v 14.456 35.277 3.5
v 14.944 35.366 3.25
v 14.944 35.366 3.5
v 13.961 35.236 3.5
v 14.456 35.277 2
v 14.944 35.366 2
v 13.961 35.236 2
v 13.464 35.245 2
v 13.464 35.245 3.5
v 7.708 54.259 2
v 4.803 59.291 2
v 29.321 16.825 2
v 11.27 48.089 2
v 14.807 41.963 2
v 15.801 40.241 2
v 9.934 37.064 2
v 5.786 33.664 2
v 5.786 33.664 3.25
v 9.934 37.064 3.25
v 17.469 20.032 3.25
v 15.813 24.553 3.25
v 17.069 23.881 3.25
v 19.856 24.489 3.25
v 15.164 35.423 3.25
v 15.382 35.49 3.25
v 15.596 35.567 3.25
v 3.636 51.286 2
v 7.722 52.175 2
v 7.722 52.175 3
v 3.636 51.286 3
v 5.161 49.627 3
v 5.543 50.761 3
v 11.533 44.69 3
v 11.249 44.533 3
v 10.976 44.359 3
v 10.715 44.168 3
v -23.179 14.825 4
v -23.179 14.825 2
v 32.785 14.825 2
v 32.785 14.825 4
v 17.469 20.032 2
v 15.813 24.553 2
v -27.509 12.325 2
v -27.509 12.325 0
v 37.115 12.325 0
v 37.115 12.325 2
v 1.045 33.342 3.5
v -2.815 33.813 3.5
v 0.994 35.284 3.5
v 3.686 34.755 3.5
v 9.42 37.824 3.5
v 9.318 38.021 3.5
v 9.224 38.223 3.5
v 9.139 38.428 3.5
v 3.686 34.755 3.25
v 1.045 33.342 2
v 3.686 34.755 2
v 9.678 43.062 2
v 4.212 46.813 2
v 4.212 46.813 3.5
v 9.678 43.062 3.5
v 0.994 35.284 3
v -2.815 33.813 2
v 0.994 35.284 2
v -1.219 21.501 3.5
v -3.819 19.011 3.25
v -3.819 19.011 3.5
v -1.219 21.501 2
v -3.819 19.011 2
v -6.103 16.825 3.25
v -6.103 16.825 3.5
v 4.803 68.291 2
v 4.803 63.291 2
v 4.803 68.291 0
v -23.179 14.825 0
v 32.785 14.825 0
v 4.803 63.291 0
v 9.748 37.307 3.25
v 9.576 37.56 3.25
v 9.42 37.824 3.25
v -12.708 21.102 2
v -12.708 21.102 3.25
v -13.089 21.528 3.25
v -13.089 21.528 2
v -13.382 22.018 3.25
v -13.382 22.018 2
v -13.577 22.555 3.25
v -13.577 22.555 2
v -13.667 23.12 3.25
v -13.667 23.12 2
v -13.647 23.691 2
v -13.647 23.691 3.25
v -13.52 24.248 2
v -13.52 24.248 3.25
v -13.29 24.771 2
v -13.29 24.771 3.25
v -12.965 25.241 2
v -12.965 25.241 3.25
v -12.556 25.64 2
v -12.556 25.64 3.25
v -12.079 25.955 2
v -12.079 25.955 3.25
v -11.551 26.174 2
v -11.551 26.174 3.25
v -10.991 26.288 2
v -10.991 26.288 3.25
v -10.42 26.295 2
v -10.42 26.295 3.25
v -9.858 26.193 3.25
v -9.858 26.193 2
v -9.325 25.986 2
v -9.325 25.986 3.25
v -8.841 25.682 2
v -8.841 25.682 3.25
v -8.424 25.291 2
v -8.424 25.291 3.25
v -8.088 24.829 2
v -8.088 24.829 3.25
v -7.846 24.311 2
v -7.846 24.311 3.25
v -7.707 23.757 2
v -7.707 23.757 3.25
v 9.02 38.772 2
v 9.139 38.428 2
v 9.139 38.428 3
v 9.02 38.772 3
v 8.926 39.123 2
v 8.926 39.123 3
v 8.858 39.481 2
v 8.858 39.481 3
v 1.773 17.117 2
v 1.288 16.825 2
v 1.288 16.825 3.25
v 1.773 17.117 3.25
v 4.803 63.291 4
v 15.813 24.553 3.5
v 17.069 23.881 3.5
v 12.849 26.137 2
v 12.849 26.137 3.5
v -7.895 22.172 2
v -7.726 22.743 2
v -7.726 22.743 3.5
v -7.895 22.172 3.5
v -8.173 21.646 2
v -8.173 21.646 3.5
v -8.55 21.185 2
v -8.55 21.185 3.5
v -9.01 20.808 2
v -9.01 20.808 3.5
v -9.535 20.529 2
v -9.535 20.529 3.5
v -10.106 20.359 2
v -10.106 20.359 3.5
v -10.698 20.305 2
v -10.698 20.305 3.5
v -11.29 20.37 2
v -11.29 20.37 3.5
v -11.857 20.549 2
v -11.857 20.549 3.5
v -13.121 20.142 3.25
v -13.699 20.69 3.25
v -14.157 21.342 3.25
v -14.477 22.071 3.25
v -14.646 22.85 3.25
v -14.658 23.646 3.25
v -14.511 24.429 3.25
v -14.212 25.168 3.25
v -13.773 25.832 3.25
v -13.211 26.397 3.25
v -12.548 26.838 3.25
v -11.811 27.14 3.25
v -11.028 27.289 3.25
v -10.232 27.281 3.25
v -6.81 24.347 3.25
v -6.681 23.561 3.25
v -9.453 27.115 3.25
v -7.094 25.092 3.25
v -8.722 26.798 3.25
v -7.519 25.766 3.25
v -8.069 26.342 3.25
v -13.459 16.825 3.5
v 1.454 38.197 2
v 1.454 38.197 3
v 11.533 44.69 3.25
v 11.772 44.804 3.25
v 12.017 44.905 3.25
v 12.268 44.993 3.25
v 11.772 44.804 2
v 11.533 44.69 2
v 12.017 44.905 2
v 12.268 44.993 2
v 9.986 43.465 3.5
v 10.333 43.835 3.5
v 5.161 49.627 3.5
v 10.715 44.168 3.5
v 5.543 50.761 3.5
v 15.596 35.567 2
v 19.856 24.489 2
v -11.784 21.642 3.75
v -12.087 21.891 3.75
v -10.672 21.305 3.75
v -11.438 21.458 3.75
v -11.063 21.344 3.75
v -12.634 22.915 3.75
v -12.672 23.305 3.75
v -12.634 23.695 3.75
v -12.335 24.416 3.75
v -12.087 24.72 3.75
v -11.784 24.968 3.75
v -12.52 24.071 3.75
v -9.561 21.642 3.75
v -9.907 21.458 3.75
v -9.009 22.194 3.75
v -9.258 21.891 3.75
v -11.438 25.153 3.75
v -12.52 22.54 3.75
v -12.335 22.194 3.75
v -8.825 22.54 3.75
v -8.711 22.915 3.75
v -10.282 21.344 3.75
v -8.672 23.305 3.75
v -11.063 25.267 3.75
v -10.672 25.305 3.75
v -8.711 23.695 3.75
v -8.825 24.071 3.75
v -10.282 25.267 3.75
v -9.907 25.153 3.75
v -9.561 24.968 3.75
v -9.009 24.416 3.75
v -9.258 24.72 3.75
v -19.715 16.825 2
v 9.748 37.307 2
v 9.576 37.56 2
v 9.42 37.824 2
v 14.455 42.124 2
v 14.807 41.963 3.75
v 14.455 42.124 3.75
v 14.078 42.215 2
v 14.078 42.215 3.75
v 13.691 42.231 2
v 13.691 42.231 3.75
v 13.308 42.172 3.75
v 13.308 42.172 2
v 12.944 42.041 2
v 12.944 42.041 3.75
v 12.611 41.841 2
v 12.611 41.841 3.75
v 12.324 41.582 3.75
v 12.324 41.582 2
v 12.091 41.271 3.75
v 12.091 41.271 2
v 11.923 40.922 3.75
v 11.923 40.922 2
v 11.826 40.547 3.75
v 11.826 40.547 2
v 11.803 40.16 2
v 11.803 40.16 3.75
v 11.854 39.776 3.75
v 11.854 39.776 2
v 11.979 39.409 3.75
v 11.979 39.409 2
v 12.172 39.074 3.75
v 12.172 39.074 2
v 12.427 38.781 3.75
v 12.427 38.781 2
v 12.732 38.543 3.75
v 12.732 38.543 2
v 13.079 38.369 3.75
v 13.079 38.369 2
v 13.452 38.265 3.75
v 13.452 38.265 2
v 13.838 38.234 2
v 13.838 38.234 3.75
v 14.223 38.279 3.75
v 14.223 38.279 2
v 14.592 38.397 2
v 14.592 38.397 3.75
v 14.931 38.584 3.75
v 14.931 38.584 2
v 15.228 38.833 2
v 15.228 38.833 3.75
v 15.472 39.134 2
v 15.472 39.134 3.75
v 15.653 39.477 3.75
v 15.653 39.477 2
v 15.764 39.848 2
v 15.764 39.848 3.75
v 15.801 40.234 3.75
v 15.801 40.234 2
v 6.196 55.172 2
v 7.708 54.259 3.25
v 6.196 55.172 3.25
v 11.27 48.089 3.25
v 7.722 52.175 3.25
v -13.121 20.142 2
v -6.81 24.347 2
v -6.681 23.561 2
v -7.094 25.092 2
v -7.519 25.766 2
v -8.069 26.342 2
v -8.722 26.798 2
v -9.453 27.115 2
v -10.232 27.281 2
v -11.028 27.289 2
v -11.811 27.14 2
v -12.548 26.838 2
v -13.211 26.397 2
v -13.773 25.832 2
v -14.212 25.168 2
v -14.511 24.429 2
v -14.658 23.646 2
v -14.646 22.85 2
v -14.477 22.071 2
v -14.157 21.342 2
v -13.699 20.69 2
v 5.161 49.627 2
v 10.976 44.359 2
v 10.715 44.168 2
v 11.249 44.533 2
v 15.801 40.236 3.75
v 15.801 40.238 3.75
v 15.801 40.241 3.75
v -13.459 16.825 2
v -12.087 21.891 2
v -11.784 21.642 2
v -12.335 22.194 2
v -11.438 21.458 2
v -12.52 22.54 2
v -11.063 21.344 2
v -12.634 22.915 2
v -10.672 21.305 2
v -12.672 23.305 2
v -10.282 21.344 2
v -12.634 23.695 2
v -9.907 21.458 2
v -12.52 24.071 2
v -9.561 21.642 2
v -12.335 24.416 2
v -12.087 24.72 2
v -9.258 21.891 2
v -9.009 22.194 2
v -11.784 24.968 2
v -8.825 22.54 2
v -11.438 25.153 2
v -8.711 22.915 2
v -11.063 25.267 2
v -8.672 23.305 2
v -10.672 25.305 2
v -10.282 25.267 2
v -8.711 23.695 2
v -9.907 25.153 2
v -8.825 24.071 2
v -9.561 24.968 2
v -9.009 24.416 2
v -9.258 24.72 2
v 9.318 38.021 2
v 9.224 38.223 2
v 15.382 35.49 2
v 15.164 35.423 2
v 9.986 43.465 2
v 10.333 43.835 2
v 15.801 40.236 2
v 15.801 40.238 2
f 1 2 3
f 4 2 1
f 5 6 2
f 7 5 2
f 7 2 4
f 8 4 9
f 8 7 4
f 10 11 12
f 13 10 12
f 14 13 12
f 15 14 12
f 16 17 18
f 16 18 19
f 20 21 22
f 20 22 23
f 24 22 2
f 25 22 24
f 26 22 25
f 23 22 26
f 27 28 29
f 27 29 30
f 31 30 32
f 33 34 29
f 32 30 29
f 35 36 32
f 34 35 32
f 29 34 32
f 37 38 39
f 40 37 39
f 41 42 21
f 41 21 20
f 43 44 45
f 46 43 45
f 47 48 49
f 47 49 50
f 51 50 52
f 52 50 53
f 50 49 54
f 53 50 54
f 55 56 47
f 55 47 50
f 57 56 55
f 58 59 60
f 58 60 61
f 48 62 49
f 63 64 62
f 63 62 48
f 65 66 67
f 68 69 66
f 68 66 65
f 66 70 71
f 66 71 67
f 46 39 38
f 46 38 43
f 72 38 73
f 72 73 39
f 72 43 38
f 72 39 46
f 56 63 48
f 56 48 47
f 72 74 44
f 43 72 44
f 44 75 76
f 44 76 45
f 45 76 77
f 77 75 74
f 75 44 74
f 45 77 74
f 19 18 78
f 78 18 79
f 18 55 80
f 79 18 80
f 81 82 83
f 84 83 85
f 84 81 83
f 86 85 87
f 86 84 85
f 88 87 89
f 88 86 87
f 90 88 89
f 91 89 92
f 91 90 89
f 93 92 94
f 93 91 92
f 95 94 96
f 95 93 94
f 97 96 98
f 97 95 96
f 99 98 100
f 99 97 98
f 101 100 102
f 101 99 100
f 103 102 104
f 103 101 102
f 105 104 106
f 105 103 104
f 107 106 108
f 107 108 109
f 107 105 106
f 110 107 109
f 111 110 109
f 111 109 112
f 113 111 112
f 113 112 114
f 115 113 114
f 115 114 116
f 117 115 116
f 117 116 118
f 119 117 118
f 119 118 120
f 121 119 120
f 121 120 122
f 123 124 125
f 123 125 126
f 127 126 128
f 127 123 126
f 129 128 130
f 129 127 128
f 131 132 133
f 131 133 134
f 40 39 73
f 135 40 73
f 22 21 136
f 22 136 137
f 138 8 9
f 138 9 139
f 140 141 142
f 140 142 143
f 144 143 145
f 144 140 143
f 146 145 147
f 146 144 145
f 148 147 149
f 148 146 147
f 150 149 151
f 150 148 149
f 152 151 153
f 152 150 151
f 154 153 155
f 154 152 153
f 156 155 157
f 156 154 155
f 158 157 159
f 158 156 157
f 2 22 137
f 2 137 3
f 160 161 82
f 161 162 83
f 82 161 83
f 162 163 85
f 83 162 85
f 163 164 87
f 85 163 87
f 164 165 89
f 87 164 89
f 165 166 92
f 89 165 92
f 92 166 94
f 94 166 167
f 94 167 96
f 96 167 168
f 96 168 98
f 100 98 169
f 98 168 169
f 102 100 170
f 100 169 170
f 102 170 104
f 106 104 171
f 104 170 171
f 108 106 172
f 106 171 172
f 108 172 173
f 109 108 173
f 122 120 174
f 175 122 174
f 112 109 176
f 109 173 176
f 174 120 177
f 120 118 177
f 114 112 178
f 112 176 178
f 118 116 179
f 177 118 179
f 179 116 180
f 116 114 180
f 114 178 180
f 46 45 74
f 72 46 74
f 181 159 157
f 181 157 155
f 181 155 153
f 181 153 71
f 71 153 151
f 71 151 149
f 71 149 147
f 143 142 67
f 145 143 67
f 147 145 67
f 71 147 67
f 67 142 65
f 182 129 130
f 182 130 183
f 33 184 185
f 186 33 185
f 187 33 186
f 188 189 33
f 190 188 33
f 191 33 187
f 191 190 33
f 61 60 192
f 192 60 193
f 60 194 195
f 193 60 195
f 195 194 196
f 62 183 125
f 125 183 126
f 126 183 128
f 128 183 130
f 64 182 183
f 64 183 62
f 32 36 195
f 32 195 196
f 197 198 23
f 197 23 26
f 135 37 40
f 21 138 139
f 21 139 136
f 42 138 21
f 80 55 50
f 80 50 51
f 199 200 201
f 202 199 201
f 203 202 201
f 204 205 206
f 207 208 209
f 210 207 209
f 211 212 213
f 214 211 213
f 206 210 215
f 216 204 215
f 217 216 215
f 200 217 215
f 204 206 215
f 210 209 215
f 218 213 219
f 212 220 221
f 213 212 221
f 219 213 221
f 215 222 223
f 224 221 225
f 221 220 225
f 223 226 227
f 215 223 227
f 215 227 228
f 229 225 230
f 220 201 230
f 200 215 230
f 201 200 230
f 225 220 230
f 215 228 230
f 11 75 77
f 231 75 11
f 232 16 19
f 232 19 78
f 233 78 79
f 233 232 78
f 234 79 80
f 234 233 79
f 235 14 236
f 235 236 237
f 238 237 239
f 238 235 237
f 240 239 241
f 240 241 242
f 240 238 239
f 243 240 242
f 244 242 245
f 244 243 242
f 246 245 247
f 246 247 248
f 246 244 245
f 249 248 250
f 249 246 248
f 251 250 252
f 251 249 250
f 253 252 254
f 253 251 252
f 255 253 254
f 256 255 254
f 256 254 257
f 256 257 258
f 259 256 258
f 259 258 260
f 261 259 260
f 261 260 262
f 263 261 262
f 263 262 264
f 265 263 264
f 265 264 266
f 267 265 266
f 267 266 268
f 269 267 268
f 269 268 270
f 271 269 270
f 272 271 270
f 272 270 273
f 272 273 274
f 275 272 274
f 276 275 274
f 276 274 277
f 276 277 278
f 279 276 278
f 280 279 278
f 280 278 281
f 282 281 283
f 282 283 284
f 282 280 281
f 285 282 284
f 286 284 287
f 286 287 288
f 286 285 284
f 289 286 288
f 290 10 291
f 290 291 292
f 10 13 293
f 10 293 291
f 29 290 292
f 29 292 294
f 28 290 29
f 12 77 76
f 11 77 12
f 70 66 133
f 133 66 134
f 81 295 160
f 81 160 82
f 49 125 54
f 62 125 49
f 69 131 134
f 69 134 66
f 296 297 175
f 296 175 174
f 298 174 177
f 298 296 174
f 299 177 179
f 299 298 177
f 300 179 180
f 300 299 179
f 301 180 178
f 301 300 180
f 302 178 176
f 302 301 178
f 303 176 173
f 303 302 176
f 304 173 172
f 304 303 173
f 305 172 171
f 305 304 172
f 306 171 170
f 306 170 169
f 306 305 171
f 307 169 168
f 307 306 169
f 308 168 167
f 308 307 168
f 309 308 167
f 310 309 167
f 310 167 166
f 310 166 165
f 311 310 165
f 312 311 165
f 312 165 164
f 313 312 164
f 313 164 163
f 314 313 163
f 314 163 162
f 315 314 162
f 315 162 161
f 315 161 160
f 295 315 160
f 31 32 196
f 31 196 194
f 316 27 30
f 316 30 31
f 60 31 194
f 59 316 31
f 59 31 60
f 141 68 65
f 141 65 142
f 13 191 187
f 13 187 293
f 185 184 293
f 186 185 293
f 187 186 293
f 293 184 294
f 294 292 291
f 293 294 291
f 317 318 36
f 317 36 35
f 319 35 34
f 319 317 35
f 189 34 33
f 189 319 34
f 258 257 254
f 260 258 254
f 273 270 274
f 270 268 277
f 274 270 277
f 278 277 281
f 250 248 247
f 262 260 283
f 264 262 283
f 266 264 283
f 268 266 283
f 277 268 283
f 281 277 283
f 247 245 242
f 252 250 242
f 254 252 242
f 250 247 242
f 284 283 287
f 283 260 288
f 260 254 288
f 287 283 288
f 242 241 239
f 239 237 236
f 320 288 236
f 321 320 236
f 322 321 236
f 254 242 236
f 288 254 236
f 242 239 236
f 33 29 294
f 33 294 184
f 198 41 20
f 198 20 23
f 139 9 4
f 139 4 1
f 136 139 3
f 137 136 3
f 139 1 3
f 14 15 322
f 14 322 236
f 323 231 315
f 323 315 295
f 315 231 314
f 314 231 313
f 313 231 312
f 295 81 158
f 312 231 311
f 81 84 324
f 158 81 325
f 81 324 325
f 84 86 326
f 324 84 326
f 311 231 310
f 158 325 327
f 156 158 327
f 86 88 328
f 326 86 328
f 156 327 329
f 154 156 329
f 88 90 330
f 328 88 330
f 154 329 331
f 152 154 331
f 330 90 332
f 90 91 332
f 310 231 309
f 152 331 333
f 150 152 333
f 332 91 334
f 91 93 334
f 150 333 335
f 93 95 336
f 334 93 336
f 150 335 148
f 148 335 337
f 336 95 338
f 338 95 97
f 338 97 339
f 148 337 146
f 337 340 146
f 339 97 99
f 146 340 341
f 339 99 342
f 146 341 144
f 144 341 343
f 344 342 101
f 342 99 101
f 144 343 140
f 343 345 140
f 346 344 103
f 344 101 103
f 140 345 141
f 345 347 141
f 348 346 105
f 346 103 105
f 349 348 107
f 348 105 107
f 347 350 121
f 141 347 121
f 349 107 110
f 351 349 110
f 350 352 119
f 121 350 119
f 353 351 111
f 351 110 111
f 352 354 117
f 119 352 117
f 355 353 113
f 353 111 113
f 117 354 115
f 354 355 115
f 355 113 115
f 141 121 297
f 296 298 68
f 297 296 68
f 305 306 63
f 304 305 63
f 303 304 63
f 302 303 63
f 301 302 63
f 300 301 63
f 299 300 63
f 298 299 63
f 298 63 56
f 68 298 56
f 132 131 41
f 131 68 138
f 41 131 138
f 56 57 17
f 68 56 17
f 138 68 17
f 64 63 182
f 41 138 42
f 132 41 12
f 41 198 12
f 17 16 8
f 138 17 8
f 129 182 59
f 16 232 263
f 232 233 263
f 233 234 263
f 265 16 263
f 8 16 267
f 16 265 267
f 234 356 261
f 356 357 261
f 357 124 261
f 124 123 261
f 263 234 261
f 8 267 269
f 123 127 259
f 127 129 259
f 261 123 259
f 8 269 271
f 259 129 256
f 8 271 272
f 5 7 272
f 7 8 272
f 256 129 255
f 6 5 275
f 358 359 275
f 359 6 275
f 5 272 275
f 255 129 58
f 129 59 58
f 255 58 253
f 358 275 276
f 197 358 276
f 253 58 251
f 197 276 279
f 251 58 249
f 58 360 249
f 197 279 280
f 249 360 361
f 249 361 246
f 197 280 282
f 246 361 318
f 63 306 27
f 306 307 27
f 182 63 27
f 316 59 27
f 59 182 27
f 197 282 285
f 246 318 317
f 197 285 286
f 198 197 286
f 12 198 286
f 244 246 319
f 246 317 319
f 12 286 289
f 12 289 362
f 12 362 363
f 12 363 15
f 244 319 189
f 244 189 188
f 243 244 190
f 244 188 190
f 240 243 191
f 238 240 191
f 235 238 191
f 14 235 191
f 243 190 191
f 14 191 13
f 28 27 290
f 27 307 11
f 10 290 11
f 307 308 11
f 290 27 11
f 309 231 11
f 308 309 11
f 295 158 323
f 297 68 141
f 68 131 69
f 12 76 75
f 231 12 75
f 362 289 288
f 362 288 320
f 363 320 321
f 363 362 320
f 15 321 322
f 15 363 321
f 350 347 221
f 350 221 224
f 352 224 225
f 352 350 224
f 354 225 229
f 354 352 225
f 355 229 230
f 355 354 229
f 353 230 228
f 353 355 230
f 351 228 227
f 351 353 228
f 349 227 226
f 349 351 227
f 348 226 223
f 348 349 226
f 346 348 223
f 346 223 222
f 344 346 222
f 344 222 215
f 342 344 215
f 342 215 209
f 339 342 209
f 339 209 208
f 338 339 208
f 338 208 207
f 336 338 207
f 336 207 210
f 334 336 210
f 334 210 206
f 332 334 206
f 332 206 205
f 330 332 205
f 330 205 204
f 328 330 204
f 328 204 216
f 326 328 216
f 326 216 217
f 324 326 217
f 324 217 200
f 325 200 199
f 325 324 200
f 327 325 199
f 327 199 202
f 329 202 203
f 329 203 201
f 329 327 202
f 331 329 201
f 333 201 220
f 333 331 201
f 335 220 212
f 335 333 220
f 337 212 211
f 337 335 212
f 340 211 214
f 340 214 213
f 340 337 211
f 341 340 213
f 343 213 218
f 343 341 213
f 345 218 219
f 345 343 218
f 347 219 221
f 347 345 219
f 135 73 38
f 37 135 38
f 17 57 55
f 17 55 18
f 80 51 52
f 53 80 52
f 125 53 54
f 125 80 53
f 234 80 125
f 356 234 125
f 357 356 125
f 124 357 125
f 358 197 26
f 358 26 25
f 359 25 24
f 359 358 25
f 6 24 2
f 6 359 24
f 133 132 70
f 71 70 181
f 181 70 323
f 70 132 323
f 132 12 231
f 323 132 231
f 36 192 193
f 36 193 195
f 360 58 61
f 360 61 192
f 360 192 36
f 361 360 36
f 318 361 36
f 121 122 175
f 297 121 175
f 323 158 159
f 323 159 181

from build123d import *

# Parameters (mm, degrees)
F1_DEPTH = 4
F2_DEPTH = 2
F3_START = 2
F3_DEPTH = 2
F4_SIZE  = 1.99999
F5_R     = 2
F6_DEPTH = 3.75
F7_DEPTH = 3.5
F8_DEPTH = 3.25
F9_DEPTH = 3


# Not quite as in the source:
# - a fillet or chamfer is up to 0.001 mm smaller than in the source, because OpenCascade refuses the exact size


with BuildPart() as f1:
    # F0 (on Top) → F1 (new body)
    with BuildSketch(Plane.XY):
        Polygon((32.7846783229, 14.824549064), (4.8026783229, 63.2907947614), (-23.1793216771, 14.824549064), align=None)
        Polygon((-19.715220062, 16.824549064), (4.8026783229, 59.2907947614), (29.3205767077, 16.824549064), align=None, mode=Mode.SUBTRACT)
    extrude(amount=F1_DEPTH)

    # F0 (on Top) → F2 (join)
    with BuildSketch(Plane.XY):
        Polygon((37.1148053418, 12.324549064), (4.8026783229, 68.2907947614), (-27.509448696, 12.324549064), align=None)
        Polygon((-23.1793216771, 14.824549064), (4.8026783229, 63.2907947614), (32.7846783229, 14.824549064), align=None, mode=Mode.SUBTRACT)
    extrude(amount=F2_DEPTH)

    # F0 (on Top) → F3 (join)
    with BuildSketch(Plane.XY.offset(F3_START)):
        Polygon((29.3205767077, 16.824549064), (4.8026783229, 59.2907947614), (-19.715220062, 16.824549064), align=None)
    extrude(amount=F3_DEPTH)

    # F4 (size 2 in the source; OpenCascade refuses exactly that, so slightly less here)
    f4_edges = [f1.edges().sort_by_distance(p)[0] for p in [
        (4.802678, 16.824549, 0),
        (-7.456271, 38.057672, 0),
        (17.061628, 38.057672, 0),
    ]]
    chamfer(f4_edges, length=F4_SIZE)

    # F5 (on face) → F6 (cut)
    with BuildSketch(Plane.XY):
        with BuildLine():
            Line((15.8012454512, 40.2407176847), (14.8071694273, 41.9625078646))
            ThreePointArc((14.8071694273, 41.9625078646), (12.0675004242, 39.2368445398), (15.801257126, 40.2338840067))
            ThreePointArc((15.801257126, 40.2338840067), (15.8012542073, 40.2373008507), (15.8012454512, 40.2407176847))
        make_face()
        with Locations((-10.6723830104, 23.3052875847)):
            Circle(F5_R)
    extrude(amount=F6_DEPTH, mode=Mode.SUBTRACT)

    # F5 (on face) → F7 (cut)
    with BuildSketch(Plane.XY):
        with BuildLine():
            Line((3.6860700174, 34.755180139), (9.4204377363, 37.8238173116))
            ThreePointArc((9.4204377363, 37.8238173116), (9.2694965624, 38.1212680469), (9.1387235678, 38.4281207834))
            Line((9.1387235678, 38.4281207834), (0.9941436583, 35.2838113904))
            Line((0.9941436583, 35.2838113904), (-2.8154677711, 33.8130667806))
            Line((-2.8154677711, 33.8130667806), (1.0452440474, 33.3419926465))
            Line((1.0452440474, 33.3419926465), (3.6860700174, 34.755180139))
        make_face()
        with BuildLine():
            Line((17.0693753854, 23.8813530259), (14.9441122519, 35.3662478082))
            ThreePointArc((14.9441122519, 35.3662478082), (14.2087911946, 35.2505200844), (13.4644377158, 35.2452416378))
            Line((13.4644377158, 35.2452416378), (12.8494622186, 26.1368211359))
            Line((12.8494622186, 26.1368211359), (15.8132929355, 24.552706629))
            Line((15.8132929355, 24.552706629), (17.0693753854, 23.8813530259))
        make_face()
        with BuildLine():
            Line((-13.4587365793, 16.824549064), (-6.1025659626, 16.824549064))
            Line((-6.1025659626, 16.824549064), (-3.819498702, 19.0105444595))
            Line((-3.819498702, 19.0105444595), (-1.2189327972, 21.5005390346))
            Line((-1.2189327972, 21.5005390346), (-7.725601985, 22.742720621))
            ThreePointArc((-7.725601985, 22.742720621), (-9.2656609828, 20.6555454959), (-11.8573356204, 20.5492238495))
            Line((-11.8573356204, 20.5492238495), (-13.4587365793, 16.824549064))
        make_face()
        with BuildLine():
            ThreePointArc((9.6781818277, 43.0623553402), (10.154568974, 43.6546537332), (10.7152328484, 44.1678964823))
            Line((10.7152328484, 44.1678964823), (5.5434275419, 50.7608279586))
            Line((5.5434275419, 50.7608279586), (5.1609951292, 49.6271412781))
            Line((5.1609951292, 49.6271412781), (4.2115291581, 46.8125343323))
            Line((4.2115291581, 46.8125343323), (9.6781818277, 43.0623553402))
        make_face()
    extrude(amount=F7_DEPTH, mode=Mode.SUBTRACT)

    # F5 (on face) → F8 (cut)
    with BuildSketch(Plane.XY):
        with BuildLine():
            Line((19.8564007878, 24.4885329157), (15.5959561349, 35.5670804467))
            ThreePointArc((15.5959561349, 35.5670804467), (15.2734627879, 35.4555359146), (14.9441122519, 35.3662478082))
            Line((14.9441122519, 35.3662478082), (17.0693753854, 23.8813530259))
            Line((17.0693753854, 23.8813530259), (15.8132929355, 24.552706629))
            Line((15.8132929355, 24.552706629), (17.4690298736, 20.0315453112))
            Line((17.4690298736, 20.0315453112), (19.8564007878, 24.4885329157))
        make_face()
        Polygon((-6.1025659626, 16.824549064), (1.2875116271, 16.824549064), (1.7734020948, 17.1169545501), (-3.819498702, 19.0105444595), align=None)
        with BuildLine():
            Line((5.785849411, 33.66388008), (9.9342960343, 37.064244924))
            ThreePointArc((9.9342960343, 37.064244924), (9.6599157648, 37.4322252607), (9.4204377363, 37.8238173116))
            Line((9.4204377363, 37.8238173116), (3.6860700174, 34.755180139))
            Line((3.6860700174, 34.755180139), (5.785849411, 33.66388008))
        make_face()
        with BuildLine():
            ThreePointArc((11.5326481984, 44.6896009562), (11.8941525727, 44.8558913869), (12.2677356256, 44.9929082563))
            Line((12.2677356256, 44.9929082563), (11.2701070238, 48.0888796571))
            Line((11.2701070238, 48.0888796571), (7.7075759005, 54.2593645662))
            Line((7.7075759005, 54.2593645662), (6.1958078295, 55.1715530455))
            Line((6.1958078295, 55.1715530455), (7.7216781624, 52.1746300315))
            Line((7.7216781624, 52.1746300315), (11.5326481984, 44.6896009562))
        make_face()
        with BuildLine():
            ThreePointArc((-12.7082549566, 21.1018299793), (-12.079105038, 25.9550296735), (-7.7066088949, 23.7571547066))
            Line((-7.7066088949, 23.7571547066), (-6.6805827438, 23.5612770993))
            ThreePointArc((-6.6805827438, 23.5612770993), (-12.5480123805, 26.8382770364), (-13.1208381636, 20.1422088056))
            Line((-13.1208381636, 20.1422088056), (-12.7082549566, 21.1018299793))
        make_face()
    extrude(amount=F8_DEPTH, mode=Mode.SUBTRACT)

    # F5 (on face) → F9 (cut)
    with BuildSketch(Plane.XY):
        with BuildLine():
            ThreePointArc((9.1387235678, 38.4281207834), (8.9697402045, 38.9468547775), (8.8582790135, 39.4809116441))
            Line((8.8582790135, 39.4809116441), (1.4540485572, 38.196541369))
            Line((1.4540485572, 38.196541369), (0.9941436583, 35.2838113904))
            Line((0.9941436583, 35.2838113904), (9.1387235678, 38.4281207834))
        make_face()
        with BuildLine():
            ThreePointArc((10.7152328484, 44.1678964823), (11.1112630591, 44.4486119837), (11.5326481984, 44.6896009562))
            Line((11.5326481984, 44.6896009562), (7.7216781624, 52.1746300315))
            Line((7.7216781624, 52.1746300315), (3.6355266348, 51.2855537236))
            Line((3.6355266348, 51.2855537236), (5.1609951292, 49.6271412781))
            Line((5.1609951292, 49.6271412781), (5.5434275419, 50.7608279586))
            Line((5.5434275419, 50.7608279586), (10.7152328484, 44.1678964823))
        make_face()
    extrude(amount=F9_DEPTH, mode=Mode.SUBTRACT)


solid = f1.part
